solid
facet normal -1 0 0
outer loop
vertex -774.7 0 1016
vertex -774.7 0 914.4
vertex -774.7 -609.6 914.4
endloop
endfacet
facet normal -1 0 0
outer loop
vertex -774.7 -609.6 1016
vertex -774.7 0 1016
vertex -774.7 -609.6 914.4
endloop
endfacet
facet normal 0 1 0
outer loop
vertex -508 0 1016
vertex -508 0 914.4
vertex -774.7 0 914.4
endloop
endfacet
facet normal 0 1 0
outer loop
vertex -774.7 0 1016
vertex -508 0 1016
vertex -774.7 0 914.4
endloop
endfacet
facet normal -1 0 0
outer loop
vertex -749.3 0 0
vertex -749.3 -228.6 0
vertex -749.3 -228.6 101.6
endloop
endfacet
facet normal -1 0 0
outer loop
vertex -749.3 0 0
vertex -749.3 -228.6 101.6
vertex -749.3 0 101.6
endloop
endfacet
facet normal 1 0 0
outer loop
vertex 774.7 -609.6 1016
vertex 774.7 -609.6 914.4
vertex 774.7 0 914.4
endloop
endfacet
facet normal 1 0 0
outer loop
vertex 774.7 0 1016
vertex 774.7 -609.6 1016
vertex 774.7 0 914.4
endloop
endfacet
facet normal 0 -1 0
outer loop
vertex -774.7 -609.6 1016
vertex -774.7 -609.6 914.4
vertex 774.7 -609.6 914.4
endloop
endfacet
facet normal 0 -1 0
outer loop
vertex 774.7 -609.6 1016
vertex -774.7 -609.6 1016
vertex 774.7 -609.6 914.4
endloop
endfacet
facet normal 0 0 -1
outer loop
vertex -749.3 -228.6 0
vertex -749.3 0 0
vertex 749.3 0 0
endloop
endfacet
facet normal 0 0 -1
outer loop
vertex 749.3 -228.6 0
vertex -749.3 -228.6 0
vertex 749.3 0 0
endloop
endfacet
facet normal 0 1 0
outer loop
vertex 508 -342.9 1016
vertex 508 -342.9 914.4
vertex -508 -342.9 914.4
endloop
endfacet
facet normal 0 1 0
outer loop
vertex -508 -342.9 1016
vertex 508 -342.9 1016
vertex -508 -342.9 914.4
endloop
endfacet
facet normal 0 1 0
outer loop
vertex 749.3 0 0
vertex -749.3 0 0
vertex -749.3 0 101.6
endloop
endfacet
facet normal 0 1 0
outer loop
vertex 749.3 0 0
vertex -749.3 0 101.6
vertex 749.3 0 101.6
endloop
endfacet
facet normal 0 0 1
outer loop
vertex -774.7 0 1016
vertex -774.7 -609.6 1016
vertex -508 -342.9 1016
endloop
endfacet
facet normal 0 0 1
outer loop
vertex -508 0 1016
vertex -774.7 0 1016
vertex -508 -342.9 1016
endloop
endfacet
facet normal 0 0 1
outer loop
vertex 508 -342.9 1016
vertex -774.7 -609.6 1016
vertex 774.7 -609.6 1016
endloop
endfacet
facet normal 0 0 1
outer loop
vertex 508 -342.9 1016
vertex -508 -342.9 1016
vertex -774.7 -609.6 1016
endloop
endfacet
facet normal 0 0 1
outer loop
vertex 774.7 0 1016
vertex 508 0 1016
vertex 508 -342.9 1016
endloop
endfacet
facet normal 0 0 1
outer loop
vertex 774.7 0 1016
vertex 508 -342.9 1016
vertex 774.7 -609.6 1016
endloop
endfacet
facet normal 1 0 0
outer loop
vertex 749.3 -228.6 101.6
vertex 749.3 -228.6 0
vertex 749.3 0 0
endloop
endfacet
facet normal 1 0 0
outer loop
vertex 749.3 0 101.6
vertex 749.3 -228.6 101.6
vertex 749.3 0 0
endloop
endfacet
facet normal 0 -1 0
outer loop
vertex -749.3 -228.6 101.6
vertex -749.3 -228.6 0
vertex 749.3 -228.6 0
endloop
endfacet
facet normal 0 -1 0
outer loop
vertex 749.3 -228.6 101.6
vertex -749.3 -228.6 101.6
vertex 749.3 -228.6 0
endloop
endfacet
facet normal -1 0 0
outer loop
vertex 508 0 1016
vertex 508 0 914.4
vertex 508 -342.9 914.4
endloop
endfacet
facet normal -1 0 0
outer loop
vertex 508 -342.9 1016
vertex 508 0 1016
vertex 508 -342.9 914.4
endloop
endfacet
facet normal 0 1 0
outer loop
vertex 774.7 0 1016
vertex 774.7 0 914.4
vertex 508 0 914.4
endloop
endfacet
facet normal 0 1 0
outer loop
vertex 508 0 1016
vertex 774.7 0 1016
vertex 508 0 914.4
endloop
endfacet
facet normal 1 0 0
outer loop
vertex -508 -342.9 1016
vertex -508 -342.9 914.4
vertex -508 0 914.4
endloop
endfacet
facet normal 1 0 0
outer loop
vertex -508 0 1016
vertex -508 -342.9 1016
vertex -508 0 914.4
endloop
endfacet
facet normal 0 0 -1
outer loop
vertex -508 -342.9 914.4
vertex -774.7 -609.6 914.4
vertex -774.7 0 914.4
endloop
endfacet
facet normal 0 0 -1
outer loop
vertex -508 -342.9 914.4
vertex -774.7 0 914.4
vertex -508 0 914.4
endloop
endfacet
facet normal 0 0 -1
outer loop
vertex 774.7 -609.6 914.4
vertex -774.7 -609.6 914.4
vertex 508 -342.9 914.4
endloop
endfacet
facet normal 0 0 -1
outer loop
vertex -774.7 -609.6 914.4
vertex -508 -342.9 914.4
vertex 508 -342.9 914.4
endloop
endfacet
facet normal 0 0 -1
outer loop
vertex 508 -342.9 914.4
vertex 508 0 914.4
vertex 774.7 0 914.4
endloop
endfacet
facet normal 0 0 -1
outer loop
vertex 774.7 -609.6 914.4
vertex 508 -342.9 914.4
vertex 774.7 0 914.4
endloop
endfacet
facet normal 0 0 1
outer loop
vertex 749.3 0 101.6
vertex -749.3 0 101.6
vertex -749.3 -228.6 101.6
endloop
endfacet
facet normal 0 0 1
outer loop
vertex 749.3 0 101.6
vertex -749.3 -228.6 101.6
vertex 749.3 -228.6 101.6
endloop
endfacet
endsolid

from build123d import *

# Parameters (mm, degrees)
F0_W     = 1498.6
F0_H     = 228.6
F1_DEPTH = 101.6
F4_DEPTH = 101.6


with BuildPart() as f1:
    # F0 (on Top) → F1 (new body)
    with BuildSketch(Plane.XY):
        with Locations((0, -114.3)):
            Rectangle(F0_W, F0_H)
    extrude(amount=F1_DEPTH)


with BuildPart() as f4:
    # F3 (on offset) → F4 (new body)
    with BuildSketch(Plane.XY.offset(914.4)):
        Polygon((-508, -342.9), (-508, 0), (-774.7, 0), (-774.7, -609.6), (774.7, -609.6), (774.7, 0), (508, 0), (508, -342.9), align=None)
    extrude(amount=F4_DEPTH)


solid = Compound([f1.part, f4.part])
